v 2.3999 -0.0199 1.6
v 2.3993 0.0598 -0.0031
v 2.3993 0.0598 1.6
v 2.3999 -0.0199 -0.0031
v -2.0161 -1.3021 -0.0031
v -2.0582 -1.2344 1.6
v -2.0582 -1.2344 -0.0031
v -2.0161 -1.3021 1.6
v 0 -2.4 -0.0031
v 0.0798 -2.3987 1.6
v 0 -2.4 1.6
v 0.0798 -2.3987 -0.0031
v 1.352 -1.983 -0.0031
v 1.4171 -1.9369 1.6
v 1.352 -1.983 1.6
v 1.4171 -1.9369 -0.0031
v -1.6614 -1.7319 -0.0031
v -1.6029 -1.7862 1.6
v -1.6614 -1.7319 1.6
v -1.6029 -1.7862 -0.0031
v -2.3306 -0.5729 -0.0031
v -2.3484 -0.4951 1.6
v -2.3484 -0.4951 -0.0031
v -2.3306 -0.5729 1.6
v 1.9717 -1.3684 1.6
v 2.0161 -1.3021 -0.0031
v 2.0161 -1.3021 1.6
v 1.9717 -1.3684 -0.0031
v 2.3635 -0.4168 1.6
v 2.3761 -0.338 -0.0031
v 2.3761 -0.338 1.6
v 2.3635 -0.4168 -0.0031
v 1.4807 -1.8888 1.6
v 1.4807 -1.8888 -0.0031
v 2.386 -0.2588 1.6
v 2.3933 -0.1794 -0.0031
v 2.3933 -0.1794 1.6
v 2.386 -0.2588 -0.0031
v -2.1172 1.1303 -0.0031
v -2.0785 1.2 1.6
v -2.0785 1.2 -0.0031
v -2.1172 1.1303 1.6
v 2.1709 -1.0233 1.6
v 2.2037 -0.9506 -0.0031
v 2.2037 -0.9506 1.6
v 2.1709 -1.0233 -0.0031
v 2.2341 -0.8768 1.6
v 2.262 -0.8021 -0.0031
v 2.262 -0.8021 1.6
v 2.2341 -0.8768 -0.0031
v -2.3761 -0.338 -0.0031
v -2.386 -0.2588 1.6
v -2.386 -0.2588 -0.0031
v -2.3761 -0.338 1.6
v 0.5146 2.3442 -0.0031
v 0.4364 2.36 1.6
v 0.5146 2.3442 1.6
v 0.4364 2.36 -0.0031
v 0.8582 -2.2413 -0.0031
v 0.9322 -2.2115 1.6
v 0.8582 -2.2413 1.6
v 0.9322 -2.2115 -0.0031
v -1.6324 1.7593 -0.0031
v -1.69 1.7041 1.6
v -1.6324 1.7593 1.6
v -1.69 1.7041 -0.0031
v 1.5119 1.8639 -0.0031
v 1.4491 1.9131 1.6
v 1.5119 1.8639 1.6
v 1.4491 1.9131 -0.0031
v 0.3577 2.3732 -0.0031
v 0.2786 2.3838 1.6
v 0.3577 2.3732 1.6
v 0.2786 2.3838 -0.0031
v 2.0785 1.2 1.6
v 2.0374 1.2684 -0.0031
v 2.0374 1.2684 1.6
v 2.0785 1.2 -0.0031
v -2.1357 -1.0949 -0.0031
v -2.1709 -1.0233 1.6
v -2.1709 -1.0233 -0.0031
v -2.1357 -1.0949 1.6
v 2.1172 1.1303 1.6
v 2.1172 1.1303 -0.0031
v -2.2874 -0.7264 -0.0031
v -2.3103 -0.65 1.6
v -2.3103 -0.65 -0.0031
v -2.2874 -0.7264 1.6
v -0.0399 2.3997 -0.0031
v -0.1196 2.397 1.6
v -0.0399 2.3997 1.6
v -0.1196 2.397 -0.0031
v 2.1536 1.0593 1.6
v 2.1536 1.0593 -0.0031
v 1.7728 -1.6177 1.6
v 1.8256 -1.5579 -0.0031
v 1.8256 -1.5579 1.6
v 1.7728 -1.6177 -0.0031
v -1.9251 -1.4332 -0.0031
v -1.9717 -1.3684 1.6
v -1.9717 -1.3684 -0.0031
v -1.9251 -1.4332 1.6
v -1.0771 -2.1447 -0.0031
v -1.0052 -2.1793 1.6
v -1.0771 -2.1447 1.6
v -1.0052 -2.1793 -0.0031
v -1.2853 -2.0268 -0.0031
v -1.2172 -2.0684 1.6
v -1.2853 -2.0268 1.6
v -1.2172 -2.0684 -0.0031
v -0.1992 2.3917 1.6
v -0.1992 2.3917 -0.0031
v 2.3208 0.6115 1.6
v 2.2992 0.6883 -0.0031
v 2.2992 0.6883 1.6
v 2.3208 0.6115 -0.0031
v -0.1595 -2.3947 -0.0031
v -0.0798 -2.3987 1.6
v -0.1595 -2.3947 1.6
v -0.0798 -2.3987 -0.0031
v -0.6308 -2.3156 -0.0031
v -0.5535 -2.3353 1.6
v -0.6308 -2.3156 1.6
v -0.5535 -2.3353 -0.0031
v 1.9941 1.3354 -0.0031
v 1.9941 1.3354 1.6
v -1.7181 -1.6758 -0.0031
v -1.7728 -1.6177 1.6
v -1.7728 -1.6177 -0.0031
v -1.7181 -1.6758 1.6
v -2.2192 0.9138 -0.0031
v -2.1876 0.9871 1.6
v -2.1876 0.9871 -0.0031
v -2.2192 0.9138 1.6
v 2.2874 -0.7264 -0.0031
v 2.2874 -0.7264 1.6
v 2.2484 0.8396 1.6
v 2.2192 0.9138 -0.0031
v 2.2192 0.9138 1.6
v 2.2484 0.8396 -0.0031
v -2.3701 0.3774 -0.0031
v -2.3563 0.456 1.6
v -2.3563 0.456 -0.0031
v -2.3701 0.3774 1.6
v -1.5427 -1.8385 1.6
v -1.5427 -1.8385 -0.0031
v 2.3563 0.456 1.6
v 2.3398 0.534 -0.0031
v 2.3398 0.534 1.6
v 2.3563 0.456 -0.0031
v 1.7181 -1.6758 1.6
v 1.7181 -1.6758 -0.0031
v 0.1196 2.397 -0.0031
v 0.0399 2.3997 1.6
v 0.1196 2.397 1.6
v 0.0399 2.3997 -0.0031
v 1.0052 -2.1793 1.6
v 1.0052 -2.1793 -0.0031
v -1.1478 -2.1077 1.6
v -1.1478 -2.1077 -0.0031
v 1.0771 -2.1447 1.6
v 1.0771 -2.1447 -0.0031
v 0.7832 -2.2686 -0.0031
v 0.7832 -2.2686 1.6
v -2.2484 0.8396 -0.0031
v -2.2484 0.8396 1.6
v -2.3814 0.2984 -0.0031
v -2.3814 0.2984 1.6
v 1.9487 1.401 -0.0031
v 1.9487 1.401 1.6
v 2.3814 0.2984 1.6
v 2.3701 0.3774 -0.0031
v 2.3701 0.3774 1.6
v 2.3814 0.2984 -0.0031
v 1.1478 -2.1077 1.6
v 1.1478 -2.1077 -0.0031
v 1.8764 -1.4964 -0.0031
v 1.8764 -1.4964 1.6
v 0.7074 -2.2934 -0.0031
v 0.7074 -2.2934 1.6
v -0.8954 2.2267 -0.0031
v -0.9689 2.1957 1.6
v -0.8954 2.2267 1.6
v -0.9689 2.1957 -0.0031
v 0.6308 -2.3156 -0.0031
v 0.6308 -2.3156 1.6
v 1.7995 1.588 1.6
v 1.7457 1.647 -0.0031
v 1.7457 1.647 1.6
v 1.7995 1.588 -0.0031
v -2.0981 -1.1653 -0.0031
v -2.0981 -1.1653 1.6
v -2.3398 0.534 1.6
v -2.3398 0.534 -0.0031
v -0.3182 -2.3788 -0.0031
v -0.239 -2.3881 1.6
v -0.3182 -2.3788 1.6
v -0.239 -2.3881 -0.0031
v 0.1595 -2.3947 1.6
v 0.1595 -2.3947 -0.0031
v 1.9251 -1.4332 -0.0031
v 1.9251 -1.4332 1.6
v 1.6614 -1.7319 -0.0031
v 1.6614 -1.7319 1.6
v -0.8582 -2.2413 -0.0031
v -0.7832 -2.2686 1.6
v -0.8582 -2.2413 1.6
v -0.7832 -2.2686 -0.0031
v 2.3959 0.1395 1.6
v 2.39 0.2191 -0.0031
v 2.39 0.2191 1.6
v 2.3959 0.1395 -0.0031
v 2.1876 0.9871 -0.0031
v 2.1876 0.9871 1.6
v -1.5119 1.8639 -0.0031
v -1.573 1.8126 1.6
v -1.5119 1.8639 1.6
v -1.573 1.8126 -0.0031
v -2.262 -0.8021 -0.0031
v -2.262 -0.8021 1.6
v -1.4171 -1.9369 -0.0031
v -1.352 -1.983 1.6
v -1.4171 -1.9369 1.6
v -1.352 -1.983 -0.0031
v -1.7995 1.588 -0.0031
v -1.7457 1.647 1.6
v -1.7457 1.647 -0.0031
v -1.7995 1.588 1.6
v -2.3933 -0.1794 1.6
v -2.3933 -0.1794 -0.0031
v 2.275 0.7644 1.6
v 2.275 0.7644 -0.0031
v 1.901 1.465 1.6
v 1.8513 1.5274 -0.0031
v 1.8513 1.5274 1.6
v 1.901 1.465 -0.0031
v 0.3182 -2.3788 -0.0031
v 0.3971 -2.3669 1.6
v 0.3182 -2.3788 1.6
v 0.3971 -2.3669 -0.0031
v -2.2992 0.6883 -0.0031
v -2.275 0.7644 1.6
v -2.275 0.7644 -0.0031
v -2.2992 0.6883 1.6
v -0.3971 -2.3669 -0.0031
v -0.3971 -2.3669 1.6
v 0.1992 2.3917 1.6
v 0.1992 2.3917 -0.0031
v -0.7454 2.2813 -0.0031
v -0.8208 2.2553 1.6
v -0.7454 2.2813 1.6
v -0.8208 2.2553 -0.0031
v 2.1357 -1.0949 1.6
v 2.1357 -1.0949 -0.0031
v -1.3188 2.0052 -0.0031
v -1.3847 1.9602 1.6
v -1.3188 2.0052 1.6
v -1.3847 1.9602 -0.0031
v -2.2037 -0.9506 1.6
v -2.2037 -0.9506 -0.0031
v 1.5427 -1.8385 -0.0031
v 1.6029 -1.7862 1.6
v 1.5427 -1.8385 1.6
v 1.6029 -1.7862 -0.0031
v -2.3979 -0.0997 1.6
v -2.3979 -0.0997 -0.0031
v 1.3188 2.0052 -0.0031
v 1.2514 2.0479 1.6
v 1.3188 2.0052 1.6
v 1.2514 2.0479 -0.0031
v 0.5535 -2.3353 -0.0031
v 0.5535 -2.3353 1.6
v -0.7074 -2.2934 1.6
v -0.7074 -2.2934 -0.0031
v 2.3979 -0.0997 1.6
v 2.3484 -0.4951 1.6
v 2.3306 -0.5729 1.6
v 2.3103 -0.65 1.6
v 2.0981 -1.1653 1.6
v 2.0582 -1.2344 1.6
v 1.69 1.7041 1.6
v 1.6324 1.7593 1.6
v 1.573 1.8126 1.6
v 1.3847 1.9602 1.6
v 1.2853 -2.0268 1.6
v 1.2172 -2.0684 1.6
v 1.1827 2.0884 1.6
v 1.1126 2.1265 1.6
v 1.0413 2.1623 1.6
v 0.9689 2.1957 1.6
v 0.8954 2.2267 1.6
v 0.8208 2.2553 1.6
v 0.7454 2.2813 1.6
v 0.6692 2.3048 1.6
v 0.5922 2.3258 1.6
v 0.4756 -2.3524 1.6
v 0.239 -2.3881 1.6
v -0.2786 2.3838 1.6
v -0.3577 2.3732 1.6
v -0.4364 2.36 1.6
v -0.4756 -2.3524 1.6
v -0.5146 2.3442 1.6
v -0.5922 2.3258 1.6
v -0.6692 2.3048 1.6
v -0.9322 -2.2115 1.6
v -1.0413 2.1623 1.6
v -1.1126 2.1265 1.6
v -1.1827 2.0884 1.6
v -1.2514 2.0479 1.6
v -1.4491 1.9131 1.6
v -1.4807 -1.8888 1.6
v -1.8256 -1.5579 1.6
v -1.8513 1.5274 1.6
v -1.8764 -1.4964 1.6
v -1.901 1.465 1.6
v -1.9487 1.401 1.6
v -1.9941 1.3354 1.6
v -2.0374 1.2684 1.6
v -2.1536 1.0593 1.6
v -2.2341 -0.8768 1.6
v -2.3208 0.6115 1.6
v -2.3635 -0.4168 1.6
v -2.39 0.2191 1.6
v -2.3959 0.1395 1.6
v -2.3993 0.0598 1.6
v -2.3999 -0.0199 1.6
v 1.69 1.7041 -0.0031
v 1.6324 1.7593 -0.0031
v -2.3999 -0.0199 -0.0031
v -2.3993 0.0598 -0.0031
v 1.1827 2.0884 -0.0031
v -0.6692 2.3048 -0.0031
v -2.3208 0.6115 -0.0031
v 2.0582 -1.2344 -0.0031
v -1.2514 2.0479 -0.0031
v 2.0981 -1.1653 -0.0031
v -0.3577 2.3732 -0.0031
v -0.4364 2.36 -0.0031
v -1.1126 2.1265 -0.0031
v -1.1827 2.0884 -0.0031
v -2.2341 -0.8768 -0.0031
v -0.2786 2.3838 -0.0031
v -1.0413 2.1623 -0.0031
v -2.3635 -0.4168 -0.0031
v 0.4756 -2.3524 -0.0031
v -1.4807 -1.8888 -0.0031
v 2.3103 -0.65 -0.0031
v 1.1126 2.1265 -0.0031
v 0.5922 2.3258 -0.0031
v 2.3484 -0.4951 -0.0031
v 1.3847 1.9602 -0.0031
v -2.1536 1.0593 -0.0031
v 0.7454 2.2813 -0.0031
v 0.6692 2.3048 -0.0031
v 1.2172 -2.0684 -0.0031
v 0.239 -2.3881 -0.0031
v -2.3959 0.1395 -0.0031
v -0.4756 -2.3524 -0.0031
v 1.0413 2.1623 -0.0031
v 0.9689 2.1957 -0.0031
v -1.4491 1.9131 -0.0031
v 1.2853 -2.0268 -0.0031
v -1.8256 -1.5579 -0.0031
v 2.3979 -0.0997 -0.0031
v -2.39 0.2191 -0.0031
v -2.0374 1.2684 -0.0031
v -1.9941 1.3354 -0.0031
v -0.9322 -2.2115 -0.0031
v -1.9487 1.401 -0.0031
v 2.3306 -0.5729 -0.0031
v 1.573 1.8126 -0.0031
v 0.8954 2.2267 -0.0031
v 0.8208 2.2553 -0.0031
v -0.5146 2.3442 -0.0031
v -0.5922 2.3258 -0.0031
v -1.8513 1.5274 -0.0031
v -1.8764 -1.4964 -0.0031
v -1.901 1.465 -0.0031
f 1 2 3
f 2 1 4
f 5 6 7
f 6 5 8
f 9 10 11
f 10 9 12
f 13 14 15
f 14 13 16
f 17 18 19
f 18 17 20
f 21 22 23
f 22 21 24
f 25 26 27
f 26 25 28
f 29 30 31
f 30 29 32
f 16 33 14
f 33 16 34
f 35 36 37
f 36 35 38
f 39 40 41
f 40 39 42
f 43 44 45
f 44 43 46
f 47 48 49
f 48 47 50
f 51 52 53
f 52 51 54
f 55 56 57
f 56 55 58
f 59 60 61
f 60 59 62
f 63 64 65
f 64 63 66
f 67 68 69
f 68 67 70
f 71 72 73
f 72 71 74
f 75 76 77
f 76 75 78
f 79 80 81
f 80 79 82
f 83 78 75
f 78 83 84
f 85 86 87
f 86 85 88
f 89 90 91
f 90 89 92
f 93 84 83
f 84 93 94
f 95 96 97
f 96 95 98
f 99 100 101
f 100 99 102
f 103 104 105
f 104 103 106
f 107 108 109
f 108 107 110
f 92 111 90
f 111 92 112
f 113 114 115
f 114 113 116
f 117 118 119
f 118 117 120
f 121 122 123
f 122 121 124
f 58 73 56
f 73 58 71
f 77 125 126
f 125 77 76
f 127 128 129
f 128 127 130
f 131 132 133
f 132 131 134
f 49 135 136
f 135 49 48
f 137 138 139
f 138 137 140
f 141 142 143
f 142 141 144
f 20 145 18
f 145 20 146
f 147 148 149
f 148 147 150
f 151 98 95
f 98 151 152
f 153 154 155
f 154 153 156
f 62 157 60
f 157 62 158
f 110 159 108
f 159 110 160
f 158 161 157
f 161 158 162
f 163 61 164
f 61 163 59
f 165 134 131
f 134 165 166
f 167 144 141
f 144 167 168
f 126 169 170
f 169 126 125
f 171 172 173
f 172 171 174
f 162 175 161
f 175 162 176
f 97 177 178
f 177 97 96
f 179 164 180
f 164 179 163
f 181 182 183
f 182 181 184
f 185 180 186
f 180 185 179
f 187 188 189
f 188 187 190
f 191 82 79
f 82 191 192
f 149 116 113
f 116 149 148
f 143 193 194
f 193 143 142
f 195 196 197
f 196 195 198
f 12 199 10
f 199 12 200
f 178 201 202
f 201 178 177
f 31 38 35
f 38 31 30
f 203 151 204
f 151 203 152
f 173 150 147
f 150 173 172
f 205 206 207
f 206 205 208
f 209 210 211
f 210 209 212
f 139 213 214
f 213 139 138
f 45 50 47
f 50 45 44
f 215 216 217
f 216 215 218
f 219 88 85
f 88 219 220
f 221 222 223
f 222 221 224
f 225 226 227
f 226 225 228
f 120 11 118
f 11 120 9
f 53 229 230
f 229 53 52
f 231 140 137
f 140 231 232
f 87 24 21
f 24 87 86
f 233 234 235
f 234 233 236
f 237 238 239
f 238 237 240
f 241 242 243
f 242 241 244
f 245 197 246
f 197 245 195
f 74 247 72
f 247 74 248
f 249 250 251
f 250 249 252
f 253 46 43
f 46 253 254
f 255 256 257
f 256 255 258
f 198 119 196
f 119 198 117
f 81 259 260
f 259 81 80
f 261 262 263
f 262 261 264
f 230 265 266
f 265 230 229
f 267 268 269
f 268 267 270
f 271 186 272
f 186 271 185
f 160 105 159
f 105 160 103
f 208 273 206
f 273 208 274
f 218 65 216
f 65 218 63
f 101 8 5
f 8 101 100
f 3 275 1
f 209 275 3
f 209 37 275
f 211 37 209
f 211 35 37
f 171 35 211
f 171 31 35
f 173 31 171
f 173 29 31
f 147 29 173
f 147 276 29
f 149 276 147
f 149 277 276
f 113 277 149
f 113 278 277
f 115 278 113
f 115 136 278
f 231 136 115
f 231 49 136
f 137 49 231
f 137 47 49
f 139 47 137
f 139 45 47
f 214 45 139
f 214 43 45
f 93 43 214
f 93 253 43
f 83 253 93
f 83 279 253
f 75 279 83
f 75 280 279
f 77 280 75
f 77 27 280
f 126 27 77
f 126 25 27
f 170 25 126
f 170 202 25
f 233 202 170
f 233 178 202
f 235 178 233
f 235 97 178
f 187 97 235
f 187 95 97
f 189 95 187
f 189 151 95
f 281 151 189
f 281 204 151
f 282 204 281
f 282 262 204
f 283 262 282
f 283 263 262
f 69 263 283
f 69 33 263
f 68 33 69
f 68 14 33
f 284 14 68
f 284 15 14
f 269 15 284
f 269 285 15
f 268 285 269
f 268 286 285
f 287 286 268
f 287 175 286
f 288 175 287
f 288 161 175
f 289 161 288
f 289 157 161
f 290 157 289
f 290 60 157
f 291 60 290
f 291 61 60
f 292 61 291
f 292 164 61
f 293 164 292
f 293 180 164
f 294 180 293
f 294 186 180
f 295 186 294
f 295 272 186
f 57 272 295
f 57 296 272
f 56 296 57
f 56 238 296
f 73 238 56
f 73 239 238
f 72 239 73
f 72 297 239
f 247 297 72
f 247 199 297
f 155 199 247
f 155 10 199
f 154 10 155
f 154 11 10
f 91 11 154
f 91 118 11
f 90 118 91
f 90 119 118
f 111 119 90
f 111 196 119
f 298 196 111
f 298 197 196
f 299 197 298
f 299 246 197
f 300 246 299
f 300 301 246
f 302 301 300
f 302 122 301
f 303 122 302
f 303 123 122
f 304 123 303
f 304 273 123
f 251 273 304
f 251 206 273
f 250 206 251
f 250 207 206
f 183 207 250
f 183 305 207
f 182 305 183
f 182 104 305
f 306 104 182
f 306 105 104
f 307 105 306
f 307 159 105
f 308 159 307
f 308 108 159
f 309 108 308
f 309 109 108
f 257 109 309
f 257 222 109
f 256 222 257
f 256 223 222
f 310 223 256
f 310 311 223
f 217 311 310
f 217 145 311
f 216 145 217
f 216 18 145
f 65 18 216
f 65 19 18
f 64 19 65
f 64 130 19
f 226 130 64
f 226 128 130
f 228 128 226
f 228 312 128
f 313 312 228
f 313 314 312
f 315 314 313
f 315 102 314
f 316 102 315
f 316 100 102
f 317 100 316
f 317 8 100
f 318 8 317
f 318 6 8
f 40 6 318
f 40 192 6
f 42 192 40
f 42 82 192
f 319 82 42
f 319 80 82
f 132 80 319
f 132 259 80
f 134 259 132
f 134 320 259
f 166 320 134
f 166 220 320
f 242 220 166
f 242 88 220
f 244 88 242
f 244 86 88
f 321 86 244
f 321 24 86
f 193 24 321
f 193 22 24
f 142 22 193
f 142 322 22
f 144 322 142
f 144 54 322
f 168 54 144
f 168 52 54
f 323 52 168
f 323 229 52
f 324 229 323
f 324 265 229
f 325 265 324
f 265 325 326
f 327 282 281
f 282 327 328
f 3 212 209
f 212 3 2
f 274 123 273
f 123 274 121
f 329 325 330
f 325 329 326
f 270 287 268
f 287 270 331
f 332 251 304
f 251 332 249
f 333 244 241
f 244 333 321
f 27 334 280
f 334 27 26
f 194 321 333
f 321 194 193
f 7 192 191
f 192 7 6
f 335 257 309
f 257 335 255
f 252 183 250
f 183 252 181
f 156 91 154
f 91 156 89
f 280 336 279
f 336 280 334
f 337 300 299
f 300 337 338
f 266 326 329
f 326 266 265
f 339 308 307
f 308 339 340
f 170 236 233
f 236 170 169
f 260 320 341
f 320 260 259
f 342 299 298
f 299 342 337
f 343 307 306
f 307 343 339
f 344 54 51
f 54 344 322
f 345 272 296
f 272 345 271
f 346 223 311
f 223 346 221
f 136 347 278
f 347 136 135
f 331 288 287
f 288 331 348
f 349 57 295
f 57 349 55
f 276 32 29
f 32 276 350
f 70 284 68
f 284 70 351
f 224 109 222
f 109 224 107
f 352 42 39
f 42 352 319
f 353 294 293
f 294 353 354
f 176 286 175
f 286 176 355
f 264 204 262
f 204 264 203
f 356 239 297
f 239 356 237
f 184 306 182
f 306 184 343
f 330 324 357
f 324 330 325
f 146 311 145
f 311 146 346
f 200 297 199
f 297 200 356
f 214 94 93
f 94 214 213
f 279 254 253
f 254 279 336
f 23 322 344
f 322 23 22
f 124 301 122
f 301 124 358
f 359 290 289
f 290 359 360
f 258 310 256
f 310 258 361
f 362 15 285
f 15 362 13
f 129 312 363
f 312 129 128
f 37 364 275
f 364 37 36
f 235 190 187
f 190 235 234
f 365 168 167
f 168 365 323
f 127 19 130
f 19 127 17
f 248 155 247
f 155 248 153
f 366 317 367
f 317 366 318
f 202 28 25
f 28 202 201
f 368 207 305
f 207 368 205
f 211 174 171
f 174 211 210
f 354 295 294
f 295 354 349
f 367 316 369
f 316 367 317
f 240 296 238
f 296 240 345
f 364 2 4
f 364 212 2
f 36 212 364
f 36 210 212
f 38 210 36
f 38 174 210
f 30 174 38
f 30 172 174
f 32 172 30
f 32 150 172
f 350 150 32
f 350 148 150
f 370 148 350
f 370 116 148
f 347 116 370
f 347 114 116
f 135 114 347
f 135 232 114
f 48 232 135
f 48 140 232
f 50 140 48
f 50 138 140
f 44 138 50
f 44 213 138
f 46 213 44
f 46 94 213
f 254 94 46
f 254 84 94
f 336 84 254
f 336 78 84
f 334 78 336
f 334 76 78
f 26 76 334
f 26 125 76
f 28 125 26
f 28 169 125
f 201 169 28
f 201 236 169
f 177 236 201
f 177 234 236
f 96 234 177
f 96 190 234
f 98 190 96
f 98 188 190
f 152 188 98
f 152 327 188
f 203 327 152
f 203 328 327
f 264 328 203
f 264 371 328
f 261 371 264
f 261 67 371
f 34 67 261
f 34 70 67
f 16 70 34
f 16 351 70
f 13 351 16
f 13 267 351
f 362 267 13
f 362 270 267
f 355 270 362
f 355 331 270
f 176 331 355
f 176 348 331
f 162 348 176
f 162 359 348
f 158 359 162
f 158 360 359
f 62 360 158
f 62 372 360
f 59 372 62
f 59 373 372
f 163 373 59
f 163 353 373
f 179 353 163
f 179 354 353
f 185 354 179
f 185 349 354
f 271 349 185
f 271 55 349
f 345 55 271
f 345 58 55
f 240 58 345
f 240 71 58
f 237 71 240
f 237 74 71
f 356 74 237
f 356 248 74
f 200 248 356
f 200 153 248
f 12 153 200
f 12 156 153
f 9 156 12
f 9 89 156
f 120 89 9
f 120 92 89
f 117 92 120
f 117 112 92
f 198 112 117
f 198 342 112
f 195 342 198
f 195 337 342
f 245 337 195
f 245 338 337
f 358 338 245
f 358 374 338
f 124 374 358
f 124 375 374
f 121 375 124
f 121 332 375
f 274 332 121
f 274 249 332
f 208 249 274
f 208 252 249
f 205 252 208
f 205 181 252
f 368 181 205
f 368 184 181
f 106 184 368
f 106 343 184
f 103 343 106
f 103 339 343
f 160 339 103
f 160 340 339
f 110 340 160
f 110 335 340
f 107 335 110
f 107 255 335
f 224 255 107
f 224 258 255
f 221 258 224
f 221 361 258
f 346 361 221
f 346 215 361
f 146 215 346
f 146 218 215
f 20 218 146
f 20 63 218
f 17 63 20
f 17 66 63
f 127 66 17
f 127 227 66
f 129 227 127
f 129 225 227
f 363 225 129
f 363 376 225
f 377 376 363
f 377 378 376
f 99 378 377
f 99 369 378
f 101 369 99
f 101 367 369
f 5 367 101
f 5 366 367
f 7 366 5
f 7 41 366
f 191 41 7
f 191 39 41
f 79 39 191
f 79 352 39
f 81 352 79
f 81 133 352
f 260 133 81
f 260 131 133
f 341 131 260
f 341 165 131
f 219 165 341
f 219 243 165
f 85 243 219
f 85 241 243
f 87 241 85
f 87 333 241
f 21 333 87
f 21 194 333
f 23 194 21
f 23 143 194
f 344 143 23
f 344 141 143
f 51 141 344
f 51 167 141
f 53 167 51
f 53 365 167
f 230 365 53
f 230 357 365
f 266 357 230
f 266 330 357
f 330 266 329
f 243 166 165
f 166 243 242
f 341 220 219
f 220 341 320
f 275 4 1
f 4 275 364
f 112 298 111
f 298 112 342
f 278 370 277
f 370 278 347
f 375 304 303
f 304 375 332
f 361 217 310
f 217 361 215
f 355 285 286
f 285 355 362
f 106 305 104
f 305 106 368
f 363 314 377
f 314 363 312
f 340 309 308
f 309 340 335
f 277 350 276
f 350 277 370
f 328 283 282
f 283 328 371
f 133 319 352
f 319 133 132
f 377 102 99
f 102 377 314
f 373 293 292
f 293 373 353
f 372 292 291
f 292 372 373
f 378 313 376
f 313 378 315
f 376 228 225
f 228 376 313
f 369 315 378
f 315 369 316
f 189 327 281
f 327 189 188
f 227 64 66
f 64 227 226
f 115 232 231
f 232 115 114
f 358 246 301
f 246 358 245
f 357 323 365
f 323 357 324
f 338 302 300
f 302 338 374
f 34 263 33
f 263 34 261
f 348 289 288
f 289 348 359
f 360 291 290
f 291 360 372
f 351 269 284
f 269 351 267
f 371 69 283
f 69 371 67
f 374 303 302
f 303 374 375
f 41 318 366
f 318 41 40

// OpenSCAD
use <../lib.scad>
use <s/3960px3s01.scad>
use <s/3960s01.scad>
use <s/3960s05.scad>
$fa=1; $fs=0.2;
function ldraw_lib__3960px3(realsolid=false) = [
// 0 Dish  4 x  4 Inverted with Jurassic World Gyrosphere Pattern
// 0 Name: 3960px3.dat
// 0 Author: Gerald Lasser [GeraldLasser]
// 0 !LDRAW_ORG Part UPDATE 2019-03
// 0 !LICENSE Licensed under CC BY 2.0 and CC BY 4.0 : see CAreadme.txt
// 
// 0 BFC CERTIFY CCW
  [0,"BFC","CERTIFY"],
  [0,"BFC","CCW"],
// 
// 0 !KEYWORDS Bricklink 3960pb034, Dimensions, Jurassic Park, Set 71205
// 
// 0 !HISTORY 2019-12-27 [PTadmin] Official Update 2019-03
// 
// 
// 1 16 0 0 0 1 0 0 0 1 0 0 0 1 s\3960s01.dat
  [1,16,0,0,0,1,0,0,0,1,0,0,0,1, ldraw_lib__s__3960s01(realsolid)],
// 
// 1 16 0 0 0 1 0 0 0 1 0 0 0 1 s\3960px3s01.dat
  [1,16,0,0,0,1,0,0,0,1,0,0,0,1, ldraw_lib__s__3960px3s01(realsolid)],
// 1 16 0 0 0 -1 0 0 0 1 0 0 0 1 s\3960px3s01.dat
  [1,16,0,0,0,-1,0,0,0,1,0,0,0,1, ldraw_lib__s__3960px3s01(realsolid)],
// 1 16 0 0 0 1 0 0 0 1 0 0 0 -1 s\3960px3s01.dat
  [1,16,0,0,0,1,0,0,0,1,0,0,0,-1, ldraw_lib__s__3960px3s01(realsolid)],
// 1 16 0 0 0 -1 0 0 0 1 0 0 0 -1 s\3960px3s01.dat
  [1,16,0,0,0,-1,0,0,0,1,0,0,0,-1, ldraw_lib__s__3960px3s01(realsolid)],
// 
// 1 16 0 0 0 0 0 -1 0 1 0 1 0 0 s\3960px3s01.dat
  [1,16,0,0,0,0,0,-1,0,1,0,1,0,0, ldraw_lib__s__3960px3s01(realsolid)],
// 1 16 0 0 0 0 0 -1 0 1 0 -1 0 0 s\3960px3s01.dat
  [1,16,0,0,0,0,0,-1,0,1,0,-1,0,0, ldraw_lib__s__3960px3s01(realsolid)],
// 1 16 0 0 0 0 0 1 0 1 0 1 0 0 s\3960px3s01.dat
  [1,16,0,0,0,0,0,1,0,1,0,1,0,0, ldraw_lib__s__3960px3s01(realsolid)],
// 1 16 0 0 0 0 0 1 0 1 0 -1 0 0 s\3960px3s01.dat
  [1,16,0,0,0,0,0,1,0,1,0,-1,0,0, ldraw_lib__s__3960px3s01(realsolid)],
// 
// 1 16 0 0 0 1 0 0 0 1 0 0 0 1 s\3960s05.dat
  [1,16,0,0,0,1,0,0,0,1,0,0,0,1, ldraw_lib__s__3960s05(realsolid)],
];
module ldraw_lib__3960px3(step=0, col=false, unit=2/5, alt=false, line=0.2, solid=!$preview)
    makepoly(ldraw_lib__3960px3(solid), step=step, col=col, unit=unit, alt=alt, line=line, solid=solid);
ldraw_lib__3960px3(line=0.2);
